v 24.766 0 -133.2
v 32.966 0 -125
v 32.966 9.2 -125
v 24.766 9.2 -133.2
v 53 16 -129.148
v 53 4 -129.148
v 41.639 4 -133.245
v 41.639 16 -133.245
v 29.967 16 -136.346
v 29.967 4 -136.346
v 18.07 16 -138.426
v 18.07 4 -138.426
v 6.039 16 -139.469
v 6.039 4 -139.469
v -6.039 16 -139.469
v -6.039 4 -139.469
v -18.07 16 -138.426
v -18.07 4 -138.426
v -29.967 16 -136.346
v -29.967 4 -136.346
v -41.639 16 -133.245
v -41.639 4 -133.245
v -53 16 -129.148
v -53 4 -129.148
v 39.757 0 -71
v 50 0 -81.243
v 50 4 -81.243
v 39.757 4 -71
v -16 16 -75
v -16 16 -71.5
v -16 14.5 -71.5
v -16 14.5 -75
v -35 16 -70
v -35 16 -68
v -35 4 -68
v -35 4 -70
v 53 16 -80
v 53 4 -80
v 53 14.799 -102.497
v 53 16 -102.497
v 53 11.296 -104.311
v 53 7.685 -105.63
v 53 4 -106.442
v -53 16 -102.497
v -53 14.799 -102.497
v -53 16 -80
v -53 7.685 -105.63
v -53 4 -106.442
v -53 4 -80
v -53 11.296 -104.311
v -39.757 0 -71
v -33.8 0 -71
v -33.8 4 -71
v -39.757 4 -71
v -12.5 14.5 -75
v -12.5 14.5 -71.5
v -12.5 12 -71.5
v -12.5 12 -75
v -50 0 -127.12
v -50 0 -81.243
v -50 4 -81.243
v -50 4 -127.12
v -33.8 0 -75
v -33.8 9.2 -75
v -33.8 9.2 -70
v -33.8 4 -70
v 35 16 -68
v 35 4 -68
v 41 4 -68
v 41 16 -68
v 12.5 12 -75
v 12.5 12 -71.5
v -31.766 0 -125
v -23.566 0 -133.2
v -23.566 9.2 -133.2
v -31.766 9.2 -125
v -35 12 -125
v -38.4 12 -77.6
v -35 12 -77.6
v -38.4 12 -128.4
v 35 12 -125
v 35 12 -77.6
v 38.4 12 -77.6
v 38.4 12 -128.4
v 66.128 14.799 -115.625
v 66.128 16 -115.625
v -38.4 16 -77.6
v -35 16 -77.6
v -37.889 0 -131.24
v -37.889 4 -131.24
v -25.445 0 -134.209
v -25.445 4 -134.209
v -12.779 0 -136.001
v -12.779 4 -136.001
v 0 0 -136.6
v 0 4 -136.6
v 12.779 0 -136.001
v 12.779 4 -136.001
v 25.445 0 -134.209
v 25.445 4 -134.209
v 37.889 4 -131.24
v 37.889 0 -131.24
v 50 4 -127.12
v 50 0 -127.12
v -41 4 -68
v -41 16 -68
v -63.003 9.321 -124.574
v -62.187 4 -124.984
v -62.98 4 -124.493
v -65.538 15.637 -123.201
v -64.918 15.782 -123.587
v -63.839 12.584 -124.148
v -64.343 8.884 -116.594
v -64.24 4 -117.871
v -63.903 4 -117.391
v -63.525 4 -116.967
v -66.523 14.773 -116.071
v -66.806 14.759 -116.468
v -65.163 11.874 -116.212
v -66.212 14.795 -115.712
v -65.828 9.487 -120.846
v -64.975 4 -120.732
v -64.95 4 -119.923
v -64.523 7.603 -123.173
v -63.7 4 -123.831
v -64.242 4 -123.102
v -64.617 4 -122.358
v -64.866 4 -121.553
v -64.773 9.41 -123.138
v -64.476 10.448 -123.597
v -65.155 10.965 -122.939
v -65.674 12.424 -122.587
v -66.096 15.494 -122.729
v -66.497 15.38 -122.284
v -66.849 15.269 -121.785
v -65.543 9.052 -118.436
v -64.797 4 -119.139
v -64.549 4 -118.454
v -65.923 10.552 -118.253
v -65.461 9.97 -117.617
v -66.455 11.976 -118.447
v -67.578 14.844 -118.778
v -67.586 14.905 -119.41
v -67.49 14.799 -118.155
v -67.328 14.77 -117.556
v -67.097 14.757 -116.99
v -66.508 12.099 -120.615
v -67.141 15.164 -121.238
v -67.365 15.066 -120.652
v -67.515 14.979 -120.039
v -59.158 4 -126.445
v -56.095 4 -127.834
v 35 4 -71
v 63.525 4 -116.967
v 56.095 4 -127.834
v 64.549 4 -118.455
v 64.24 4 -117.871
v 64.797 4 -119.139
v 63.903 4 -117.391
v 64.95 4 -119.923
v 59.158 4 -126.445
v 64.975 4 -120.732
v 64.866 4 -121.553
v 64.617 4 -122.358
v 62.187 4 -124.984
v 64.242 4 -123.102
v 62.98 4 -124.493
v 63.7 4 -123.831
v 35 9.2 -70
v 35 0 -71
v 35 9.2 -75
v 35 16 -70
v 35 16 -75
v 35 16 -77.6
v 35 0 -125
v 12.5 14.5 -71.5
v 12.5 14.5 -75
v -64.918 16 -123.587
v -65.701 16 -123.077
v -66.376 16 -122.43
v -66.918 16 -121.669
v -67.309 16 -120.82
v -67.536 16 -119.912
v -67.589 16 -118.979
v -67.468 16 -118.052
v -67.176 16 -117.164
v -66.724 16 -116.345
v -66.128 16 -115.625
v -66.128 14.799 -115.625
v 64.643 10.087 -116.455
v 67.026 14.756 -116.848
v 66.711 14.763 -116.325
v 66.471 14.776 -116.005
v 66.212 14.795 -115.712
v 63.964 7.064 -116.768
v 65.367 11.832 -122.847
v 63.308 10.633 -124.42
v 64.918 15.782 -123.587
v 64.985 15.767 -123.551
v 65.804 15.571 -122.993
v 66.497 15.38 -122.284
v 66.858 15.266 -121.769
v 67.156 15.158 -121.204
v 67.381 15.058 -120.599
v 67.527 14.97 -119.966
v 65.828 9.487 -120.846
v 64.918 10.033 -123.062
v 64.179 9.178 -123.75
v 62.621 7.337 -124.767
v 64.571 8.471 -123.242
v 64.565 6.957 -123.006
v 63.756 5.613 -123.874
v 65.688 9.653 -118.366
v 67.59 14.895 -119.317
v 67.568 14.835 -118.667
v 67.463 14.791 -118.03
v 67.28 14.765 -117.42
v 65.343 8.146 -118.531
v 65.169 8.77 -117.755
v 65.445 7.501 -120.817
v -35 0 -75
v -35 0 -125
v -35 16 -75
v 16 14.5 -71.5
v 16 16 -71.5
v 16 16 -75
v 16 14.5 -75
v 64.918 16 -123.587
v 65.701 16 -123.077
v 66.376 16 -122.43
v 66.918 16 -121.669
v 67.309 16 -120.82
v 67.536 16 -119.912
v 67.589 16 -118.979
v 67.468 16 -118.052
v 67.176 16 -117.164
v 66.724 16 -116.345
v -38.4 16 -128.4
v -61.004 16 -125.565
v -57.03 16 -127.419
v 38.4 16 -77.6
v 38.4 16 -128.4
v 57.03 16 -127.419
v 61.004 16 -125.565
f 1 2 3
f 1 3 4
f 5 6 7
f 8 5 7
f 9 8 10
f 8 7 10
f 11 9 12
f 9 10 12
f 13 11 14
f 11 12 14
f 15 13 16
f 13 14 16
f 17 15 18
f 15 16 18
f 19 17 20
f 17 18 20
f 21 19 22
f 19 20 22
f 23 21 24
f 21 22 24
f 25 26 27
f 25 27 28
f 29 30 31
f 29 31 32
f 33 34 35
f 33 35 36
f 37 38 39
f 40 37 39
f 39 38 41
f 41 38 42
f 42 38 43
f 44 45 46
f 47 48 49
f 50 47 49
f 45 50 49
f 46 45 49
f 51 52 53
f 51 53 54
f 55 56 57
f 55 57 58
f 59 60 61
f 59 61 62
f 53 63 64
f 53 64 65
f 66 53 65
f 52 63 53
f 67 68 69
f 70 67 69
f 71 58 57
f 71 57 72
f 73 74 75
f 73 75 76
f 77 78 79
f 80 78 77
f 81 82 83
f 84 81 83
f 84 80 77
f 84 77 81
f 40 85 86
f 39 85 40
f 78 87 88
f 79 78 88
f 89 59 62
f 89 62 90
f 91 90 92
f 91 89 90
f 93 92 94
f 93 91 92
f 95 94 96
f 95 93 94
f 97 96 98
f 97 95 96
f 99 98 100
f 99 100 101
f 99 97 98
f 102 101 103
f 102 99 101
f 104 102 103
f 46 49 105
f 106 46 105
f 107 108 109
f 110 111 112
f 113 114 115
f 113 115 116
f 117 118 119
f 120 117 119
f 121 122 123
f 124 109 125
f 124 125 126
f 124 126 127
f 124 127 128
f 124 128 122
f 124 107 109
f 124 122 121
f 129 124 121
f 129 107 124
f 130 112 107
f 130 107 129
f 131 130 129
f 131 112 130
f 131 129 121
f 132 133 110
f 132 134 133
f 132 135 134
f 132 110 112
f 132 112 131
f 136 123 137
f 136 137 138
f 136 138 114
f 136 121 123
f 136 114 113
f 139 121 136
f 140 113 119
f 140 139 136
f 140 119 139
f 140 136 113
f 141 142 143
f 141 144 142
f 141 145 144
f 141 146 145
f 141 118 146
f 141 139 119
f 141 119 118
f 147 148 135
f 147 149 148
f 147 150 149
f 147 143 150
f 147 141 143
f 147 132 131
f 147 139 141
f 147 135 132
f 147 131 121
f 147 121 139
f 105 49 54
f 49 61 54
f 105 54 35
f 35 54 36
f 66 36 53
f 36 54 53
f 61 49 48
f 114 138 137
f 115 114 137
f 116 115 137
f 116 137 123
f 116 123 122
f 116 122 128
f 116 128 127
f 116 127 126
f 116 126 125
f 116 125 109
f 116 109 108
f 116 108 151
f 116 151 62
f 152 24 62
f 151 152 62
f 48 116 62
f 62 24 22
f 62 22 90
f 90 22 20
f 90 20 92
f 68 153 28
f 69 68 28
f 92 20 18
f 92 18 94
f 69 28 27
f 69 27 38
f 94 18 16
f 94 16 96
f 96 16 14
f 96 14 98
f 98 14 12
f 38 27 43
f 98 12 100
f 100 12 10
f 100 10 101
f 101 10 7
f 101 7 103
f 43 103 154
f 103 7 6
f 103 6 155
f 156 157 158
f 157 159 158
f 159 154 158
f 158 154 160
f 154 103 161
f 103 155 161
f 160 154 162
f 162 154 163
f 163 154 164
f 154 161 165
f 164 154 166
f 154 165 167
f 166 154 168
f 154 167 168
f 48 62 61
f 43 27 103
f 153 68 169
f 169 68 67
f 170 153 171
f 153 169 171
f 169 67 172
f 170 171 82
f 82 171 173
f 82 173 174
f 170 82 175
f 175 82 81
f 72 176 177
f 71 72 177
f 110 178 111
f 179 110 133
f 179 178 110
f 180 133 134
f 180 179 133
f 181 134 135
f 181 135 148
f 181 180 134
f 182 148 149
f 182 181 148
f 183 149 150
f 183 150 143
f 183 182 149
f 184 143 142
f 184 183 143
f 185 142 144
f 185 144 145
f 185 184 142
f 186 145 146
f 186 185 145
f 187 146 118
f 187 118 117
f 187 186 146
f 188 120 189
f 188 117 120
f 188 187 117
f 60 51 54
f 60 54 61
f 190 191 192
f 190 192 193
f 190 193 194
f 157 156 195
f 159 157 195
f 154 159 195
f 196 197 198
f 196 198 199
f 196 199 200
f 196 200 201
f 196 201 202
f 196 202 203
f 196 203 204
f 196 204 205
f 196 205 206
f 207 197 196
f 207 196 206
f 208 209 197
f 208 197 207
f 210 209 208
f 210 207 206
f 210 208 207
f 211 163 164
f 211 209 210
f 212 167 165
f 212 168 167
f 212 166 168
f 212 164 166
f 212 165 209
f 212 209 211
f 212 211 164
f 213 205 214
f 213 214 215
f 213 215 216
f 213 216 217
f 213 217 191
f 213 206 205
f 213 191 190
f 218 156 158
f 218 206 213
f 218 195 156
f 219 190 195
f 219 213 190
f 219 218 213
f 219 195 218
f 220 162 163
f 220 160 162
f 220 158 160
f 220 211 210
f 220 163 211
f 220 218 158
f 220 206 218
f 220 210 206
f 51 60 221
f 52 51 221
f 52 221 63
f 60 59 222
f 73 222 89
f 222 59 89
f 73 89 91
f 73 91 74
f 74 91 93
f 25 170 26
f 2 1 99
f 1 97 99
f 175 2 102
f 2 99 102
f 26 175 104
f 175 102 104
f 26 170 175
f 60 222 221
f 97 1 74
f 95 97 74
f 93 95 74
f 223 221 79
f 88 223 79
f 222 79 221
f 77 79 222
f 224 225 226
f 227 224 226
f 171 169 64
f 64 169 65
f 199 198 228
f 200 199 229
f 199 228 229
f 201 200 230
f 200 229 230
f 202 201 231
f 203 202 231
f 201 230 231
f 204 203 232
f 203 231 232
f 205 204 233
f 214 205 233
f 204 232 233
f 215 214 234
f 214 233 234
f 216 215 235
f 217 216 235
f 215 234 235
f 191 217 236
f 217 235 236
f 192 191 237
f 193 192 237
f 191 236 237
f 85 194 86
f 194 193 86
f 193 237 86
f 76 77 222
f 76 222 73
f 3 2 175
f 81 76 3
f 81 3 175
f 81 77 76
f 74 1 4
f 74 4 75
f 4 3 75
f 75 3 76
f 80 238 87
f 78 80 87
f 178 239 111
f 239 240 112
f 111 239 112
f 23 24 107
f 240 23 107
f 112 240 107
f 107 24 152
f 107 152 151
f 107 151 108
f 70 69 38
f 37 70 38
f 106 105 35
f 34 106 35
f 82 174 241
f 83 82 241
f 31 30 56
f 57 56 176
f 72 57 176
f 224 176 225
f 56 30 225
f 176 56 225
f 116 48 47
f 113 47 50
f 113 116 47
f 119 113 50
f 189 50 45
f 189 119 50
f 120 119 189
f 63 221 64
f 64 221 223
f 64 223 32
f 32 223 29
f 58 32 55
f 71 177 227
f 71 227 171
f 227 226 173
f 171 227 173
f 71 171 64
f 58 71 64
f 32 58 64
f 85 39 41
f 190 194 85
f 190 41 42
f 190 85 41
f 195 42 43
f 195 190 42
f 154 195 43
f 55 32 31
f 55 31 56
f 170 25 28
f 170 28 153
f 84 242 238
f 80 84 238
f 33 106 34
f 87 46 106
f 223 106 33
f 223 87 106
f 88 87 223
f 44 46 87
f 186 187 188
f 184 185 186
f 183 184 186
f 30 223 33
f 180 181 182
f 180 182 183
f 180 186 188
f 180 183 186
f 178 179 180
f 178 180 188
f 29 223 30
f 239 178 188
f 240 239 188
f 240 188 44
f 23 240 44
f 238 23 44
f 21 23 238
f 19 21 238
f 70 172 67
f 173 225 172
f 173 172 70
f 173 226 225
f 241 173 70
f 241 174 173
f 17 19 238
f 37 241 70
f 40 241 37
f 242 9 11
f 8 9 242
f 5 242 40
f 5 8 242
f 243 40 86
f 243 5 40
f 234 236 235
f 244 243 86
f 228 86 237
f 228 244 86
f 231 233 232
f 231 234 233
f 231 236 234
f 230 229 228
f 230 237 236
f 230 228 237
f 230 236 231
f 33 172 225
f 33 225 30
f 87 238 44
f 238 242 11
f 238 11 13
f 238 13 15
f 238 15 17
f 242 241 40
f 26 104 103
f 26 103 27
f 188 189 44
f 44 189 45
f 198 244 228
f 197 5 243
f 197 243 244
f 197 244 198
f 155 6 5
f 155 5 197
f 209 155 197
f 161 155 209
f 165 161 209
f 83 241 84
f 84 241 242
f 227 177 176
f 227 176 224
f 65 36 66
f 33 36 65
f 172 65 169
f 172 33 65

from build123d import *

# Parameters (mm, degrees)
BOSS_EXTRUDE1_DEPTH = 16
CUT_EXTRUDE1_DEPTH  = 9.2
CUT_EXTRUDE2_REACH  = 152.177
SKETCH3_W           = 70
SKETCH3_H           = 50
SKETCH7_OUTSIDE_W   = 133.782
SKETCH7_OUTSIDE_H   = 99.382
CUT_EXTRUDE5_DEPTH  = 4
BOSS_EXTRUDE3_START = -12
BOSS_EXTRUDE3_DEPTH = 12
CUT_EXTRUDE7_REACH  = 174.842
SKETCH9_R           = 38
CUT_EXTRUDE8_REACH  = 174.842
SKETCH10_R          = 38
FILLET1_R           = 5
SKETCH12_W          = 25
SKETCH12_H          = 3.5
CUT_EXTRUDE10_DEPTH = 4
SKETCH13_W          = 3.5
SKETCH13_H          = 3.5
CUT_EXTRUDE11_DEPTH = 1.5
CUT_EXTRUDE12_REACH = 157.926
SKETCH14_W          = 70
SKETCH14_H          = 2
CUT_EXTRUDE13_DEPTH = 4


with BuildPart() as part:
    # Sketch1 → Boss-Extrude1 (new body)
    with BuildSketch(Plane(origin=(0, 0, 0), x_dir=(1, 0, 0), z_dir=(0, 1, 0))):
        with BuildLine():
            Line((-53, 129.147822281), (-53, 80))
            Line((-53, 80), (-41, 68))
            Line((-41, 68), (41, 68))
            Line((41, 68), (53, 80))
            Line((53, 80), (53, 129.147822281))
            ThreePointArc((53, 129.147822281), (0, 139.6), (-53, 129.147822281))
        make_face()
    extrude(amount=BOSS_EXTRUDE1_DEPTH)

    # Sketch2 → Cut-Extrude1 (cut)
    with BuildSketch(Plane.XZ):
        Polygon((-33.8, -122.965685425), (-33.8, -62.4), (35, -62.4), (35, -122.965685425), (24.765685425, -133.2), (-23.565685425, -133.2), align=None)
    extrude(amount=-CUT_EXTRUDE1_DEPTH, mode=Mode.SUBTRACT)

    # Sketch3 → Cut-Extrude2 (cut, up to next)
    with BuildSketch(Plane(origin=(0, 16, 0), x_dir=(1, 0, 0), z_dir=(0, 1, 0)), mode=Mode.PRIVATE) as cut_extrude2_sk1:
        with Locations((0, 100)):
            Rectangle(SKETCH3_W, SKETCH3_H)
    cut_extrude2_tool1 = extrude(cut_extrude2_sk1.sketch, amount=-CUT_EXTRUDE2_REACH, mode=Mode.PRIVATE) & part.part
    add(cut_extrude2_tool1.solids().sort_by_distance((0, 16, -100))[0], mode=Mode.SUBTRACT)

    # Sketch7 outside → Cut-Extrude5 (cut)
    with BuildSketch(Plane.XZ):
        with Locations((0, -103.8)):
            Rectangle(SKETCH7_OUTSIDE_W, SKETCH7_OUTSIDE_H)
        with BuildLine():
            Line((-50, -81.242640687), (-50, -127.120258024))
            ThreePointArc((-50, -127.120258024), (0, -136.6), (50, -127.120258024))
            Line((50, -127.120258024), (50, -81.242640687))
            Line((50, -81.242640687), (39.757359313, -71))
            Line((39.757359313, -71), (35, -71))
            Line((35, -71), (-33.8, -71))
            Line((-33.8, -71), (-39.757359313, -71))
            Line((-39.757359313, -71), (-50, -81.242640687))
        make_face(mode=Mode.SUBTRACT)
    extrude(amount=-CUT_EXTRUDE5_DEPTH, mode=Mode.SUBTRACT)

    # Sketch8 → Boss-Extrude3 (add)
    with BuildSketch(Plane(origin=(0, 16, 0), x_dir=(1, 0, 0), z_dir=(0, 1, 0)).offset(BOSS_EXTRUDE3_START)):
        with BuildLine():
            Line((70.810563619, 120.308038302), (53, 102.497474683))
            Line((53, 102.497474683), (53, 129.147822281))
            ThreePointArc((53, 129.147822281), (62.062866201, 125.045434299), (70.810563619, 120.308038302))
        make_face()
    boss_extrude3 = extrude(amount=BOSS_EXTRUDE3_DEPTH)

    # Mirror1: Boss-Extrude3 across plane
    add(boss_extrude3.mirror(Plane(origin=(0, 0, 0), x_dir=(0, 0, 1), z_dir=(1, 0, 0))))

    # Cut-Extrude7: up to this plane
    cut_extrude7_end = Plane(origin=(53, 16, -80), z_dir=(-1, 0, 0))
    # Sketch9 → Cut-Extrude7 (cut, up to the surface)
    with BuildSketch(Plane(origin=(95.55930096, 0, -95.55930096), x_dir=(0, 1, 0), z_dir=(-0.7071067811865488, 0, 0.7071067811865464)), mode=Mode.PRIVATE) as cut_extrude7_sk1:
        Circle(SKETCH9_R)
    cut_extrude7_tool1 = split(extrude(cut_extrude7_sk1.sketch, amount=CUT_EXTRUDE7_REACH, mode=Mode.PRIVATE), bisect_by=cut_extrude7_end, keep=Keep.BOTH, mode=Mode.PRIVATE)
    add(cut_extrude7_tool1.solids().sort_by_distance((95.559301, 0, -95.559301))[0], mode=Mode.SUBTRACT)

    # Cut-Extrude8: up to this plane
    cut_extrude8_end = Plane(origin=(-53, 16, -129.147822281), z_dir=(1, 0, 0))
    # Sketch10 → Cut-Extrude8 (cut, up to the surface)
    with BuildSketch(Plane(origin=(-95.55930096, 0, -95.55930096), x_dir=(0, 1, 0), z_dir=(0.7071067811865488, 0, 0.7071067811865464)), mode=Mode.PRIVATE) as cut_extrude8_sk1:
        Circle(SKETCH10_R)
    cut_extrude8_tool1 = split(extrude(cut_extrude8_sk1.sketch, amount=CUT_EXTRUDE8_REACH, mode=Mode.PRIVATE), bisect_by=cut_extrude8_end, keep=Keep.BOTH, mode=Mode.PRIVATE)
    add(cut_extrude8_tool1.solids().sort_by_distance((-95.559301, 0, -95.559301))[0], mode=Mode.SUBTRACT)

    # Fillet1
    fillet1_edges = [part.edges().sort_by_distance(p)[0] for p in [
        (70.810563619, 15.399324293, -120.308038302),
        (69.207065384, 9.508661419, -121.237544106),
        (-70.810563619, 15.399324293, -120.308038302),
        (-69.207065384, 9.508661419, -121.237544106),
    ]]
    fillet(fillet1_edges, radius=FILLET1_R)

    # Sketch12 → Cut-Extrude10 (cut)
    with BuildSketch(Plane(origin=(0, 16, 0), x_dir=(1, 0, 0), z_dir=(0, 1, 0))):
        with Locations((0, 73.25)):
            Rectangle(SKETCH12_W, SKETCH12_H)
    extrude(amount=-CUT_EXTRUDE10_DEPTH, mode=Mode.SUBTRACT)

    # Sketch13 → Cut-Extrude11 (cut)
    with BuildSketch(Plane(origin=(0, 16, 0), x_dir=(1, 0, 0), z_dir=(0, 1, 0))):
        with Locations((-14.25, 73.25)):
            Rectangle(SKETCH13_W, SKETCH13_H)
        with Locations((14.25, 73.25)):
            Rectangle(SKETCH13_W, SKETCH13_H)
    extrude(amount=-CUT_EXTRUDE11_DEPTH, mode=Mode.SUBTRACT)

    # Sketch14 → Cut-Extrude12 (cut, up to next)
    with BuildSketch(Plane(origin=(0, 16, 0), x_dir=(1, 0, 0), z_dir=(0, 1, 0)), mode=Mode.PRIVATE) as cut_extrude12_sk1:
        with Locations((0, 69)):
            Rectangle(SKETCH14_W, SKETCH14_H)
    cut_extrude12_tool1 = extrude(cut_extrude12_sk1.sketch, amount=-CUT_EXTRUDE12_REACH, mode=Mode.PRIVATE) & part.part
    add(cut_extrude12_tool1.solids().sort_by_distance((0, 16, -69))[0], mode=Mode.SUBTRACT)

    # Sketch15 → Cut-Extrude13 (cut)
    with BuildSketch(Plane(origin=(0, 16, 0), x_dir=(1, 0, 0), z_dir=(0, 1, 0))):
        Polygon((-35, 77.6), (-35, 125), (35, 125), (35, 77.6), (38.4, 77.6), (38.4, 128.4), (-38.4, 128.4), (-38.4, 77.6), align=None)
    extrude(amount=-CUT_EXTRUDE13_DEPTH, mode=Mode.SUBTRACT)


solid = part.part
